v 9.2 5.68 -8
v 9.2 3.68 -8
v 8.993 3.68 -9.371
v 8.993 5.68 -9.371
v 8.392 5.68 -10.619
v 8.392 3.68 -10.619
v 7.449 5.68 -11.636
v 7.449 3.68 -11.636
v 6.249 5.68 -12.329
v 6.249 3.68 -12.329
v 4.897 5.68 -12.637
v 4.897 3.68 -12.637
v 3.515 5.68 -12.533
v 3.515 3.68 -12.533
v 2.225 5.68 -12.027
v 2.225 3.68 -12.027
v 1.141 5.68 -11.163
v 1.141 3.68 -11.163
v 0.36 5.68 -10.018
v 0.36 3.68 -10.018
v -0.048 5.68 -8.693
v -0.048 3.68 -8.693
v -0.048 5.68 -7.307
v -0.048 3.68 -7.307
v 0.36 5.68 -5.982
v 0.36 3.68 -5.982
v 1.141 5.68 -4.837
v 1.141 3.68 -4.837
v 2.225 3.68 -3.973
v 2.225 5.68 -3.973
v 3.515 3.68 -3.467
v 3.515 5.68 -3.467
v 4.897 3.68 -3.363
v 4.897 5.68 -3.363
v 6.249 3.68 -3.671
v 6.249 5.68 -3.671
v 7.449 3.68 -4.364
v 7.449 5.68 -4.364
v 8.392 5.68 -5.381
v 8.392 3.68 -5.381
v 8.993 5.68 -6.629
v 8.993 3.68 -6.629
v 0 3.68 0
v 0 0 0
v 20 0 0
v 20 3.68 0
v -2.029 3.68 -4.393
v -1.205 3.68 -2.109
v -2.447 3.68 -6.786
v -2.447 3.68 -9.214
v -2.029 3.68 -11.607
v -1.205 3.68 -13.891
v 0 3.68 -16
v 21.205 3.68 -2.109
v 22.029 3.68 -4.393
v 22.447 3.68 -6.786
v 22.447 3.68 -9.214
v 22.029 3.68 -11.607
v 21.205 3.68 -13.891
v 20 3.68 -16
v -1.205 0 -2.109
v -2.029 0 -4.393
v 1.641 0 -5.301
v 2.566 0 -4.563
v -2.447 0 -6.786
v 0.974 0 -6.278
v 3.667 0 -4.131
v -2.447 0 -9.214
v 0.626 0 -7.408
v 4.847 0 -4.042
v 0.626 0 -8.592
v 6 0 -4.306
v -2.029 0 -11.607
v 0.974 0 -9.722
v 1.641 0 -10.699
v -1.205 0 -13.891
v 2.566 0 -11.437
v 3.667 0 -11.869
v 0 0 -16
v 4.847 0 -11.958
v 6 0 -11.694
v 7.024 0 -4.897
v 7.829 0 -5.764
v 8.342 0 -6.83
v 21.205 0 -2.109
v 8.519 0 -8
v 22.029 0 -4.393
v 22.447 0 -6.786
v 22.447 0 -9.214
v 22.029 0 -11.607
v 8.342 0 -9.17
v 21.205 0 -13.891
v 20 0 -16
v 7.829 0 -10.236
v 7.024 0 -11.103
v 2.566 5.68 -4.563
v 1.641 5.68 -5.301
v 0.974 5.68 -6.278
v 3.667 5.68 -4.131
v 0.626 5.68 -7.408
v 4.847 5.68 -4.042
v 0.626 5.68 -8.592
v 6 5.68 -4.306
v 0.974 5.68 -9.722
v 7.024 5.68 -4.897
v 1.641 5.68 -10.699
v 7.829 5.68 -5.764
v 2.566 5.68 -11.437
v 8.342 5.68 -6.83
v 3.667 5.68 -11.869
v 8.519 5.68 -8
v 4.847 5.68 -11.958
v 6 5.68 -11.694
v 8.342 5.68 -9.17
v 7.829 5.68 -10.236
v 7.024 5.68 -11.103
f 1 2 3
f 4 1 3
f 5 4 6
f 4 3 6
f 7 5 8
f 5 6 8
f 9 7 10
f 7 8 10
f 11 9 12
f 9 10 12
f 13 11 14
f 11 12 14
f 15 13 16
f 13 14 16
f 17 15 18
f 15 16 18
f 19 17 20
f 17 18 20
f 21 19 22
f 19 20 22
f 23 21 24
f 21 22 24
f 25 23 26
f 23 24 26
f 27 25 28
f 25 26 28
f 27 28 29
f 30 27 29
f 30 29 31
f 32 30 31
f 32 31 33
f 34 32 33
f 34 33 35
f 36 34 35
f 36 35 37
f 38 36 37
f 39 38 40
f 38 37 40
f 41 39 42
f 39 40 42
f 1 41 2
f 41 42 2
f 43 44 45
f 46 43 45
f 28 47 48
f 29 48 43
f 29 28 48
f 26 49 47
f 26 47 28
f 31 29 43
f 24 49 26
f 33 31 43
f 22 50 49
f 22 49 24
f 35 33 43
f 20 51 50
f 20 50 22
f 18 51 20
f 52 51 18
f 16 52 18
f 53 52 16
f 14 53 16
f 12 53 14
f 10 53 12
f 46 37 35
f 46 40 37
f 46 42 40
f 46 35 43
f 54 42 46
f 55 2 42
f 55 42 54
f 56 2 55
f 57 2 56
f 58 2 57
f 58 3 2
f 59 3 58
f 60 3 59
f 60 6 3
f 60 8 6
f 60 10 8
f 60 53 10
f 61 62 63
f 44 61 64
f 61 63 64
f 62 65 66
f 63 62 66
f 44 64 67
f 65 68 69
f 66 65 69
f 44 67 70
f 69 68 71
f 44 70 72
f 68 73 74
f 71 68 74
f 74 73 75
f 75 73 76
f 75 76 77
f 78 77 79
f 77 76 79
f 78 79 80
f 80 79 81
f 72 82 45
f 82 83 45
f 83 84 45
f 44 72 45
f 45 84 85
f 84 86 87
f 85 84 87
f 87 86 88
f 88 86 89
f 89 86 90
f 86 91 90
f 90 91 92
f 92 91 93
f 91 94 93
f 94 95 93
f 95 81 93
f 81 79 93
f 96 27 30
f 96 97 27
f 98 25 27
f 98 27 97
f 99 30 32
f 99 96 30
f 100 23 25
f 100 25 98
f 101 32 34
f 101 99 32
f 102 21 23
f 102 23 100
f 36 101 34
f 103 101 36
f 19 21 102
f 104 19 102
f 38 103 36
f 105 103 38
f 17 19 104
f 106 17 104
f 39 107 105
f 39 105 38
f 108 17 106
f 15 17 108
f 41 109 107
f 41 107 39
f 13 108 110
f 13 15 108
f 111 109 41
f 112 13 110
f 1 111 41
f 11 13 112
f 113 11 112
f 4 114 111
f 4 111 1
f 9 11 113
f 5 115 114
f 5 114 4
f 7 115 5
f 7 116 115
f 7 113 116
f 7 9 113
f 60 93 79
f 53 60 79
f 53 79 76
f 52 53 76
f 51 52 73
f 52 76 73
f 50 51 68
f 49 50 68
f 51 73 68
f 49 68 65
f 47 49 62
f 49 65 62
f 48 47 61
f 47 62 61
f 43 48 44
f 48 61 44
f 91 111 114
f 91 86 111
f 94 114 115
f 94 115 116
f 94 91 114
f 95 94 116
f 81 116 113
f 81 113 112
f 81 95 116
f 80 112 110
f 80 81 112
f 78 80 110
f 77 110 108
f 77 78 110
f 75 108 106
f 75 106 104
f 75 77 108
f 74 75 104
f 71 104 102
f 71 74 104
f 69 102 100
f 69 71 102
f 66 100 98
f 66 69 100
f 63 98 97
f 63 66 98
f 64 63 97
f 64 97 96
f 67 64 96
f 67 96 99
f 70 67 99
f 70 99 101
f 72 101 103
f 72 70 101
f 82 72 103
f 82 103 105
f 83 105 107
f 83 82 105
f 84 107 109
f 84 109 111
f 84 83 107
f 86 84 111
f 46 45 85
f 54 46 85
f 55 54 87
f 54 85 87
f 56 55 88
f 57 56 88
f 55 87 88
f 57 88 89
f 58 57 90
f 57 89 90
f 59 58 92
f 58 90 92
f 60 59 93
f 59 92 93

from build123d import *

# Parameters (mm, degrees)
SKETCH2_R           = 3.96875
BOSS_EXTRUDE1_DEPTH = 3.68
SKETCH3_R           = 4.65
SKETCH3_R_2         = 3.96875
BOSS_EXTRUDE2_DEPTH = 2


with BuildPart() as part:
    # Sketch2 → Boss-Extrude1 (new body)
    with BuildSketch(Plane(origin=(0, 0, 0), x_dir=(1, 0, 0), z_dir=(0, 1, 0))):
        with BuildLine():
            Line((0, 0), (20, 0))
            ThreePointArc((20, 0), (22.5, 8), (20, 16))
            Line((20, 16), (0, 16))
            ThreePointArc((0, 16), (-2.5, 8), (0, 0))
        make_face()
        with Locations((4.55, 8)):
            Circle(SKETCH2_R, mode=Mode.SUBTRACT)
    extrude(amount=BOSS_EXTRUDE1_DEPTH)

    # Sketch3 → Boss-Extrude2 (add)
    with BuildSketch(Plane(origin=(0, 3.68, 0), x_dir=(1, 0, 0), z_dir=(0, 1, 0))):
        with Locations((4.55, 8)):
            Circle(SKETCH3_R)
        with Locations((4.55, 8)):
            Circle(SKETCH3_R_2, mode=Mode.SUBTRACT)
    extrude(amount=BOSS_EXTRUDE2_DEPTH)


solid = part.part
